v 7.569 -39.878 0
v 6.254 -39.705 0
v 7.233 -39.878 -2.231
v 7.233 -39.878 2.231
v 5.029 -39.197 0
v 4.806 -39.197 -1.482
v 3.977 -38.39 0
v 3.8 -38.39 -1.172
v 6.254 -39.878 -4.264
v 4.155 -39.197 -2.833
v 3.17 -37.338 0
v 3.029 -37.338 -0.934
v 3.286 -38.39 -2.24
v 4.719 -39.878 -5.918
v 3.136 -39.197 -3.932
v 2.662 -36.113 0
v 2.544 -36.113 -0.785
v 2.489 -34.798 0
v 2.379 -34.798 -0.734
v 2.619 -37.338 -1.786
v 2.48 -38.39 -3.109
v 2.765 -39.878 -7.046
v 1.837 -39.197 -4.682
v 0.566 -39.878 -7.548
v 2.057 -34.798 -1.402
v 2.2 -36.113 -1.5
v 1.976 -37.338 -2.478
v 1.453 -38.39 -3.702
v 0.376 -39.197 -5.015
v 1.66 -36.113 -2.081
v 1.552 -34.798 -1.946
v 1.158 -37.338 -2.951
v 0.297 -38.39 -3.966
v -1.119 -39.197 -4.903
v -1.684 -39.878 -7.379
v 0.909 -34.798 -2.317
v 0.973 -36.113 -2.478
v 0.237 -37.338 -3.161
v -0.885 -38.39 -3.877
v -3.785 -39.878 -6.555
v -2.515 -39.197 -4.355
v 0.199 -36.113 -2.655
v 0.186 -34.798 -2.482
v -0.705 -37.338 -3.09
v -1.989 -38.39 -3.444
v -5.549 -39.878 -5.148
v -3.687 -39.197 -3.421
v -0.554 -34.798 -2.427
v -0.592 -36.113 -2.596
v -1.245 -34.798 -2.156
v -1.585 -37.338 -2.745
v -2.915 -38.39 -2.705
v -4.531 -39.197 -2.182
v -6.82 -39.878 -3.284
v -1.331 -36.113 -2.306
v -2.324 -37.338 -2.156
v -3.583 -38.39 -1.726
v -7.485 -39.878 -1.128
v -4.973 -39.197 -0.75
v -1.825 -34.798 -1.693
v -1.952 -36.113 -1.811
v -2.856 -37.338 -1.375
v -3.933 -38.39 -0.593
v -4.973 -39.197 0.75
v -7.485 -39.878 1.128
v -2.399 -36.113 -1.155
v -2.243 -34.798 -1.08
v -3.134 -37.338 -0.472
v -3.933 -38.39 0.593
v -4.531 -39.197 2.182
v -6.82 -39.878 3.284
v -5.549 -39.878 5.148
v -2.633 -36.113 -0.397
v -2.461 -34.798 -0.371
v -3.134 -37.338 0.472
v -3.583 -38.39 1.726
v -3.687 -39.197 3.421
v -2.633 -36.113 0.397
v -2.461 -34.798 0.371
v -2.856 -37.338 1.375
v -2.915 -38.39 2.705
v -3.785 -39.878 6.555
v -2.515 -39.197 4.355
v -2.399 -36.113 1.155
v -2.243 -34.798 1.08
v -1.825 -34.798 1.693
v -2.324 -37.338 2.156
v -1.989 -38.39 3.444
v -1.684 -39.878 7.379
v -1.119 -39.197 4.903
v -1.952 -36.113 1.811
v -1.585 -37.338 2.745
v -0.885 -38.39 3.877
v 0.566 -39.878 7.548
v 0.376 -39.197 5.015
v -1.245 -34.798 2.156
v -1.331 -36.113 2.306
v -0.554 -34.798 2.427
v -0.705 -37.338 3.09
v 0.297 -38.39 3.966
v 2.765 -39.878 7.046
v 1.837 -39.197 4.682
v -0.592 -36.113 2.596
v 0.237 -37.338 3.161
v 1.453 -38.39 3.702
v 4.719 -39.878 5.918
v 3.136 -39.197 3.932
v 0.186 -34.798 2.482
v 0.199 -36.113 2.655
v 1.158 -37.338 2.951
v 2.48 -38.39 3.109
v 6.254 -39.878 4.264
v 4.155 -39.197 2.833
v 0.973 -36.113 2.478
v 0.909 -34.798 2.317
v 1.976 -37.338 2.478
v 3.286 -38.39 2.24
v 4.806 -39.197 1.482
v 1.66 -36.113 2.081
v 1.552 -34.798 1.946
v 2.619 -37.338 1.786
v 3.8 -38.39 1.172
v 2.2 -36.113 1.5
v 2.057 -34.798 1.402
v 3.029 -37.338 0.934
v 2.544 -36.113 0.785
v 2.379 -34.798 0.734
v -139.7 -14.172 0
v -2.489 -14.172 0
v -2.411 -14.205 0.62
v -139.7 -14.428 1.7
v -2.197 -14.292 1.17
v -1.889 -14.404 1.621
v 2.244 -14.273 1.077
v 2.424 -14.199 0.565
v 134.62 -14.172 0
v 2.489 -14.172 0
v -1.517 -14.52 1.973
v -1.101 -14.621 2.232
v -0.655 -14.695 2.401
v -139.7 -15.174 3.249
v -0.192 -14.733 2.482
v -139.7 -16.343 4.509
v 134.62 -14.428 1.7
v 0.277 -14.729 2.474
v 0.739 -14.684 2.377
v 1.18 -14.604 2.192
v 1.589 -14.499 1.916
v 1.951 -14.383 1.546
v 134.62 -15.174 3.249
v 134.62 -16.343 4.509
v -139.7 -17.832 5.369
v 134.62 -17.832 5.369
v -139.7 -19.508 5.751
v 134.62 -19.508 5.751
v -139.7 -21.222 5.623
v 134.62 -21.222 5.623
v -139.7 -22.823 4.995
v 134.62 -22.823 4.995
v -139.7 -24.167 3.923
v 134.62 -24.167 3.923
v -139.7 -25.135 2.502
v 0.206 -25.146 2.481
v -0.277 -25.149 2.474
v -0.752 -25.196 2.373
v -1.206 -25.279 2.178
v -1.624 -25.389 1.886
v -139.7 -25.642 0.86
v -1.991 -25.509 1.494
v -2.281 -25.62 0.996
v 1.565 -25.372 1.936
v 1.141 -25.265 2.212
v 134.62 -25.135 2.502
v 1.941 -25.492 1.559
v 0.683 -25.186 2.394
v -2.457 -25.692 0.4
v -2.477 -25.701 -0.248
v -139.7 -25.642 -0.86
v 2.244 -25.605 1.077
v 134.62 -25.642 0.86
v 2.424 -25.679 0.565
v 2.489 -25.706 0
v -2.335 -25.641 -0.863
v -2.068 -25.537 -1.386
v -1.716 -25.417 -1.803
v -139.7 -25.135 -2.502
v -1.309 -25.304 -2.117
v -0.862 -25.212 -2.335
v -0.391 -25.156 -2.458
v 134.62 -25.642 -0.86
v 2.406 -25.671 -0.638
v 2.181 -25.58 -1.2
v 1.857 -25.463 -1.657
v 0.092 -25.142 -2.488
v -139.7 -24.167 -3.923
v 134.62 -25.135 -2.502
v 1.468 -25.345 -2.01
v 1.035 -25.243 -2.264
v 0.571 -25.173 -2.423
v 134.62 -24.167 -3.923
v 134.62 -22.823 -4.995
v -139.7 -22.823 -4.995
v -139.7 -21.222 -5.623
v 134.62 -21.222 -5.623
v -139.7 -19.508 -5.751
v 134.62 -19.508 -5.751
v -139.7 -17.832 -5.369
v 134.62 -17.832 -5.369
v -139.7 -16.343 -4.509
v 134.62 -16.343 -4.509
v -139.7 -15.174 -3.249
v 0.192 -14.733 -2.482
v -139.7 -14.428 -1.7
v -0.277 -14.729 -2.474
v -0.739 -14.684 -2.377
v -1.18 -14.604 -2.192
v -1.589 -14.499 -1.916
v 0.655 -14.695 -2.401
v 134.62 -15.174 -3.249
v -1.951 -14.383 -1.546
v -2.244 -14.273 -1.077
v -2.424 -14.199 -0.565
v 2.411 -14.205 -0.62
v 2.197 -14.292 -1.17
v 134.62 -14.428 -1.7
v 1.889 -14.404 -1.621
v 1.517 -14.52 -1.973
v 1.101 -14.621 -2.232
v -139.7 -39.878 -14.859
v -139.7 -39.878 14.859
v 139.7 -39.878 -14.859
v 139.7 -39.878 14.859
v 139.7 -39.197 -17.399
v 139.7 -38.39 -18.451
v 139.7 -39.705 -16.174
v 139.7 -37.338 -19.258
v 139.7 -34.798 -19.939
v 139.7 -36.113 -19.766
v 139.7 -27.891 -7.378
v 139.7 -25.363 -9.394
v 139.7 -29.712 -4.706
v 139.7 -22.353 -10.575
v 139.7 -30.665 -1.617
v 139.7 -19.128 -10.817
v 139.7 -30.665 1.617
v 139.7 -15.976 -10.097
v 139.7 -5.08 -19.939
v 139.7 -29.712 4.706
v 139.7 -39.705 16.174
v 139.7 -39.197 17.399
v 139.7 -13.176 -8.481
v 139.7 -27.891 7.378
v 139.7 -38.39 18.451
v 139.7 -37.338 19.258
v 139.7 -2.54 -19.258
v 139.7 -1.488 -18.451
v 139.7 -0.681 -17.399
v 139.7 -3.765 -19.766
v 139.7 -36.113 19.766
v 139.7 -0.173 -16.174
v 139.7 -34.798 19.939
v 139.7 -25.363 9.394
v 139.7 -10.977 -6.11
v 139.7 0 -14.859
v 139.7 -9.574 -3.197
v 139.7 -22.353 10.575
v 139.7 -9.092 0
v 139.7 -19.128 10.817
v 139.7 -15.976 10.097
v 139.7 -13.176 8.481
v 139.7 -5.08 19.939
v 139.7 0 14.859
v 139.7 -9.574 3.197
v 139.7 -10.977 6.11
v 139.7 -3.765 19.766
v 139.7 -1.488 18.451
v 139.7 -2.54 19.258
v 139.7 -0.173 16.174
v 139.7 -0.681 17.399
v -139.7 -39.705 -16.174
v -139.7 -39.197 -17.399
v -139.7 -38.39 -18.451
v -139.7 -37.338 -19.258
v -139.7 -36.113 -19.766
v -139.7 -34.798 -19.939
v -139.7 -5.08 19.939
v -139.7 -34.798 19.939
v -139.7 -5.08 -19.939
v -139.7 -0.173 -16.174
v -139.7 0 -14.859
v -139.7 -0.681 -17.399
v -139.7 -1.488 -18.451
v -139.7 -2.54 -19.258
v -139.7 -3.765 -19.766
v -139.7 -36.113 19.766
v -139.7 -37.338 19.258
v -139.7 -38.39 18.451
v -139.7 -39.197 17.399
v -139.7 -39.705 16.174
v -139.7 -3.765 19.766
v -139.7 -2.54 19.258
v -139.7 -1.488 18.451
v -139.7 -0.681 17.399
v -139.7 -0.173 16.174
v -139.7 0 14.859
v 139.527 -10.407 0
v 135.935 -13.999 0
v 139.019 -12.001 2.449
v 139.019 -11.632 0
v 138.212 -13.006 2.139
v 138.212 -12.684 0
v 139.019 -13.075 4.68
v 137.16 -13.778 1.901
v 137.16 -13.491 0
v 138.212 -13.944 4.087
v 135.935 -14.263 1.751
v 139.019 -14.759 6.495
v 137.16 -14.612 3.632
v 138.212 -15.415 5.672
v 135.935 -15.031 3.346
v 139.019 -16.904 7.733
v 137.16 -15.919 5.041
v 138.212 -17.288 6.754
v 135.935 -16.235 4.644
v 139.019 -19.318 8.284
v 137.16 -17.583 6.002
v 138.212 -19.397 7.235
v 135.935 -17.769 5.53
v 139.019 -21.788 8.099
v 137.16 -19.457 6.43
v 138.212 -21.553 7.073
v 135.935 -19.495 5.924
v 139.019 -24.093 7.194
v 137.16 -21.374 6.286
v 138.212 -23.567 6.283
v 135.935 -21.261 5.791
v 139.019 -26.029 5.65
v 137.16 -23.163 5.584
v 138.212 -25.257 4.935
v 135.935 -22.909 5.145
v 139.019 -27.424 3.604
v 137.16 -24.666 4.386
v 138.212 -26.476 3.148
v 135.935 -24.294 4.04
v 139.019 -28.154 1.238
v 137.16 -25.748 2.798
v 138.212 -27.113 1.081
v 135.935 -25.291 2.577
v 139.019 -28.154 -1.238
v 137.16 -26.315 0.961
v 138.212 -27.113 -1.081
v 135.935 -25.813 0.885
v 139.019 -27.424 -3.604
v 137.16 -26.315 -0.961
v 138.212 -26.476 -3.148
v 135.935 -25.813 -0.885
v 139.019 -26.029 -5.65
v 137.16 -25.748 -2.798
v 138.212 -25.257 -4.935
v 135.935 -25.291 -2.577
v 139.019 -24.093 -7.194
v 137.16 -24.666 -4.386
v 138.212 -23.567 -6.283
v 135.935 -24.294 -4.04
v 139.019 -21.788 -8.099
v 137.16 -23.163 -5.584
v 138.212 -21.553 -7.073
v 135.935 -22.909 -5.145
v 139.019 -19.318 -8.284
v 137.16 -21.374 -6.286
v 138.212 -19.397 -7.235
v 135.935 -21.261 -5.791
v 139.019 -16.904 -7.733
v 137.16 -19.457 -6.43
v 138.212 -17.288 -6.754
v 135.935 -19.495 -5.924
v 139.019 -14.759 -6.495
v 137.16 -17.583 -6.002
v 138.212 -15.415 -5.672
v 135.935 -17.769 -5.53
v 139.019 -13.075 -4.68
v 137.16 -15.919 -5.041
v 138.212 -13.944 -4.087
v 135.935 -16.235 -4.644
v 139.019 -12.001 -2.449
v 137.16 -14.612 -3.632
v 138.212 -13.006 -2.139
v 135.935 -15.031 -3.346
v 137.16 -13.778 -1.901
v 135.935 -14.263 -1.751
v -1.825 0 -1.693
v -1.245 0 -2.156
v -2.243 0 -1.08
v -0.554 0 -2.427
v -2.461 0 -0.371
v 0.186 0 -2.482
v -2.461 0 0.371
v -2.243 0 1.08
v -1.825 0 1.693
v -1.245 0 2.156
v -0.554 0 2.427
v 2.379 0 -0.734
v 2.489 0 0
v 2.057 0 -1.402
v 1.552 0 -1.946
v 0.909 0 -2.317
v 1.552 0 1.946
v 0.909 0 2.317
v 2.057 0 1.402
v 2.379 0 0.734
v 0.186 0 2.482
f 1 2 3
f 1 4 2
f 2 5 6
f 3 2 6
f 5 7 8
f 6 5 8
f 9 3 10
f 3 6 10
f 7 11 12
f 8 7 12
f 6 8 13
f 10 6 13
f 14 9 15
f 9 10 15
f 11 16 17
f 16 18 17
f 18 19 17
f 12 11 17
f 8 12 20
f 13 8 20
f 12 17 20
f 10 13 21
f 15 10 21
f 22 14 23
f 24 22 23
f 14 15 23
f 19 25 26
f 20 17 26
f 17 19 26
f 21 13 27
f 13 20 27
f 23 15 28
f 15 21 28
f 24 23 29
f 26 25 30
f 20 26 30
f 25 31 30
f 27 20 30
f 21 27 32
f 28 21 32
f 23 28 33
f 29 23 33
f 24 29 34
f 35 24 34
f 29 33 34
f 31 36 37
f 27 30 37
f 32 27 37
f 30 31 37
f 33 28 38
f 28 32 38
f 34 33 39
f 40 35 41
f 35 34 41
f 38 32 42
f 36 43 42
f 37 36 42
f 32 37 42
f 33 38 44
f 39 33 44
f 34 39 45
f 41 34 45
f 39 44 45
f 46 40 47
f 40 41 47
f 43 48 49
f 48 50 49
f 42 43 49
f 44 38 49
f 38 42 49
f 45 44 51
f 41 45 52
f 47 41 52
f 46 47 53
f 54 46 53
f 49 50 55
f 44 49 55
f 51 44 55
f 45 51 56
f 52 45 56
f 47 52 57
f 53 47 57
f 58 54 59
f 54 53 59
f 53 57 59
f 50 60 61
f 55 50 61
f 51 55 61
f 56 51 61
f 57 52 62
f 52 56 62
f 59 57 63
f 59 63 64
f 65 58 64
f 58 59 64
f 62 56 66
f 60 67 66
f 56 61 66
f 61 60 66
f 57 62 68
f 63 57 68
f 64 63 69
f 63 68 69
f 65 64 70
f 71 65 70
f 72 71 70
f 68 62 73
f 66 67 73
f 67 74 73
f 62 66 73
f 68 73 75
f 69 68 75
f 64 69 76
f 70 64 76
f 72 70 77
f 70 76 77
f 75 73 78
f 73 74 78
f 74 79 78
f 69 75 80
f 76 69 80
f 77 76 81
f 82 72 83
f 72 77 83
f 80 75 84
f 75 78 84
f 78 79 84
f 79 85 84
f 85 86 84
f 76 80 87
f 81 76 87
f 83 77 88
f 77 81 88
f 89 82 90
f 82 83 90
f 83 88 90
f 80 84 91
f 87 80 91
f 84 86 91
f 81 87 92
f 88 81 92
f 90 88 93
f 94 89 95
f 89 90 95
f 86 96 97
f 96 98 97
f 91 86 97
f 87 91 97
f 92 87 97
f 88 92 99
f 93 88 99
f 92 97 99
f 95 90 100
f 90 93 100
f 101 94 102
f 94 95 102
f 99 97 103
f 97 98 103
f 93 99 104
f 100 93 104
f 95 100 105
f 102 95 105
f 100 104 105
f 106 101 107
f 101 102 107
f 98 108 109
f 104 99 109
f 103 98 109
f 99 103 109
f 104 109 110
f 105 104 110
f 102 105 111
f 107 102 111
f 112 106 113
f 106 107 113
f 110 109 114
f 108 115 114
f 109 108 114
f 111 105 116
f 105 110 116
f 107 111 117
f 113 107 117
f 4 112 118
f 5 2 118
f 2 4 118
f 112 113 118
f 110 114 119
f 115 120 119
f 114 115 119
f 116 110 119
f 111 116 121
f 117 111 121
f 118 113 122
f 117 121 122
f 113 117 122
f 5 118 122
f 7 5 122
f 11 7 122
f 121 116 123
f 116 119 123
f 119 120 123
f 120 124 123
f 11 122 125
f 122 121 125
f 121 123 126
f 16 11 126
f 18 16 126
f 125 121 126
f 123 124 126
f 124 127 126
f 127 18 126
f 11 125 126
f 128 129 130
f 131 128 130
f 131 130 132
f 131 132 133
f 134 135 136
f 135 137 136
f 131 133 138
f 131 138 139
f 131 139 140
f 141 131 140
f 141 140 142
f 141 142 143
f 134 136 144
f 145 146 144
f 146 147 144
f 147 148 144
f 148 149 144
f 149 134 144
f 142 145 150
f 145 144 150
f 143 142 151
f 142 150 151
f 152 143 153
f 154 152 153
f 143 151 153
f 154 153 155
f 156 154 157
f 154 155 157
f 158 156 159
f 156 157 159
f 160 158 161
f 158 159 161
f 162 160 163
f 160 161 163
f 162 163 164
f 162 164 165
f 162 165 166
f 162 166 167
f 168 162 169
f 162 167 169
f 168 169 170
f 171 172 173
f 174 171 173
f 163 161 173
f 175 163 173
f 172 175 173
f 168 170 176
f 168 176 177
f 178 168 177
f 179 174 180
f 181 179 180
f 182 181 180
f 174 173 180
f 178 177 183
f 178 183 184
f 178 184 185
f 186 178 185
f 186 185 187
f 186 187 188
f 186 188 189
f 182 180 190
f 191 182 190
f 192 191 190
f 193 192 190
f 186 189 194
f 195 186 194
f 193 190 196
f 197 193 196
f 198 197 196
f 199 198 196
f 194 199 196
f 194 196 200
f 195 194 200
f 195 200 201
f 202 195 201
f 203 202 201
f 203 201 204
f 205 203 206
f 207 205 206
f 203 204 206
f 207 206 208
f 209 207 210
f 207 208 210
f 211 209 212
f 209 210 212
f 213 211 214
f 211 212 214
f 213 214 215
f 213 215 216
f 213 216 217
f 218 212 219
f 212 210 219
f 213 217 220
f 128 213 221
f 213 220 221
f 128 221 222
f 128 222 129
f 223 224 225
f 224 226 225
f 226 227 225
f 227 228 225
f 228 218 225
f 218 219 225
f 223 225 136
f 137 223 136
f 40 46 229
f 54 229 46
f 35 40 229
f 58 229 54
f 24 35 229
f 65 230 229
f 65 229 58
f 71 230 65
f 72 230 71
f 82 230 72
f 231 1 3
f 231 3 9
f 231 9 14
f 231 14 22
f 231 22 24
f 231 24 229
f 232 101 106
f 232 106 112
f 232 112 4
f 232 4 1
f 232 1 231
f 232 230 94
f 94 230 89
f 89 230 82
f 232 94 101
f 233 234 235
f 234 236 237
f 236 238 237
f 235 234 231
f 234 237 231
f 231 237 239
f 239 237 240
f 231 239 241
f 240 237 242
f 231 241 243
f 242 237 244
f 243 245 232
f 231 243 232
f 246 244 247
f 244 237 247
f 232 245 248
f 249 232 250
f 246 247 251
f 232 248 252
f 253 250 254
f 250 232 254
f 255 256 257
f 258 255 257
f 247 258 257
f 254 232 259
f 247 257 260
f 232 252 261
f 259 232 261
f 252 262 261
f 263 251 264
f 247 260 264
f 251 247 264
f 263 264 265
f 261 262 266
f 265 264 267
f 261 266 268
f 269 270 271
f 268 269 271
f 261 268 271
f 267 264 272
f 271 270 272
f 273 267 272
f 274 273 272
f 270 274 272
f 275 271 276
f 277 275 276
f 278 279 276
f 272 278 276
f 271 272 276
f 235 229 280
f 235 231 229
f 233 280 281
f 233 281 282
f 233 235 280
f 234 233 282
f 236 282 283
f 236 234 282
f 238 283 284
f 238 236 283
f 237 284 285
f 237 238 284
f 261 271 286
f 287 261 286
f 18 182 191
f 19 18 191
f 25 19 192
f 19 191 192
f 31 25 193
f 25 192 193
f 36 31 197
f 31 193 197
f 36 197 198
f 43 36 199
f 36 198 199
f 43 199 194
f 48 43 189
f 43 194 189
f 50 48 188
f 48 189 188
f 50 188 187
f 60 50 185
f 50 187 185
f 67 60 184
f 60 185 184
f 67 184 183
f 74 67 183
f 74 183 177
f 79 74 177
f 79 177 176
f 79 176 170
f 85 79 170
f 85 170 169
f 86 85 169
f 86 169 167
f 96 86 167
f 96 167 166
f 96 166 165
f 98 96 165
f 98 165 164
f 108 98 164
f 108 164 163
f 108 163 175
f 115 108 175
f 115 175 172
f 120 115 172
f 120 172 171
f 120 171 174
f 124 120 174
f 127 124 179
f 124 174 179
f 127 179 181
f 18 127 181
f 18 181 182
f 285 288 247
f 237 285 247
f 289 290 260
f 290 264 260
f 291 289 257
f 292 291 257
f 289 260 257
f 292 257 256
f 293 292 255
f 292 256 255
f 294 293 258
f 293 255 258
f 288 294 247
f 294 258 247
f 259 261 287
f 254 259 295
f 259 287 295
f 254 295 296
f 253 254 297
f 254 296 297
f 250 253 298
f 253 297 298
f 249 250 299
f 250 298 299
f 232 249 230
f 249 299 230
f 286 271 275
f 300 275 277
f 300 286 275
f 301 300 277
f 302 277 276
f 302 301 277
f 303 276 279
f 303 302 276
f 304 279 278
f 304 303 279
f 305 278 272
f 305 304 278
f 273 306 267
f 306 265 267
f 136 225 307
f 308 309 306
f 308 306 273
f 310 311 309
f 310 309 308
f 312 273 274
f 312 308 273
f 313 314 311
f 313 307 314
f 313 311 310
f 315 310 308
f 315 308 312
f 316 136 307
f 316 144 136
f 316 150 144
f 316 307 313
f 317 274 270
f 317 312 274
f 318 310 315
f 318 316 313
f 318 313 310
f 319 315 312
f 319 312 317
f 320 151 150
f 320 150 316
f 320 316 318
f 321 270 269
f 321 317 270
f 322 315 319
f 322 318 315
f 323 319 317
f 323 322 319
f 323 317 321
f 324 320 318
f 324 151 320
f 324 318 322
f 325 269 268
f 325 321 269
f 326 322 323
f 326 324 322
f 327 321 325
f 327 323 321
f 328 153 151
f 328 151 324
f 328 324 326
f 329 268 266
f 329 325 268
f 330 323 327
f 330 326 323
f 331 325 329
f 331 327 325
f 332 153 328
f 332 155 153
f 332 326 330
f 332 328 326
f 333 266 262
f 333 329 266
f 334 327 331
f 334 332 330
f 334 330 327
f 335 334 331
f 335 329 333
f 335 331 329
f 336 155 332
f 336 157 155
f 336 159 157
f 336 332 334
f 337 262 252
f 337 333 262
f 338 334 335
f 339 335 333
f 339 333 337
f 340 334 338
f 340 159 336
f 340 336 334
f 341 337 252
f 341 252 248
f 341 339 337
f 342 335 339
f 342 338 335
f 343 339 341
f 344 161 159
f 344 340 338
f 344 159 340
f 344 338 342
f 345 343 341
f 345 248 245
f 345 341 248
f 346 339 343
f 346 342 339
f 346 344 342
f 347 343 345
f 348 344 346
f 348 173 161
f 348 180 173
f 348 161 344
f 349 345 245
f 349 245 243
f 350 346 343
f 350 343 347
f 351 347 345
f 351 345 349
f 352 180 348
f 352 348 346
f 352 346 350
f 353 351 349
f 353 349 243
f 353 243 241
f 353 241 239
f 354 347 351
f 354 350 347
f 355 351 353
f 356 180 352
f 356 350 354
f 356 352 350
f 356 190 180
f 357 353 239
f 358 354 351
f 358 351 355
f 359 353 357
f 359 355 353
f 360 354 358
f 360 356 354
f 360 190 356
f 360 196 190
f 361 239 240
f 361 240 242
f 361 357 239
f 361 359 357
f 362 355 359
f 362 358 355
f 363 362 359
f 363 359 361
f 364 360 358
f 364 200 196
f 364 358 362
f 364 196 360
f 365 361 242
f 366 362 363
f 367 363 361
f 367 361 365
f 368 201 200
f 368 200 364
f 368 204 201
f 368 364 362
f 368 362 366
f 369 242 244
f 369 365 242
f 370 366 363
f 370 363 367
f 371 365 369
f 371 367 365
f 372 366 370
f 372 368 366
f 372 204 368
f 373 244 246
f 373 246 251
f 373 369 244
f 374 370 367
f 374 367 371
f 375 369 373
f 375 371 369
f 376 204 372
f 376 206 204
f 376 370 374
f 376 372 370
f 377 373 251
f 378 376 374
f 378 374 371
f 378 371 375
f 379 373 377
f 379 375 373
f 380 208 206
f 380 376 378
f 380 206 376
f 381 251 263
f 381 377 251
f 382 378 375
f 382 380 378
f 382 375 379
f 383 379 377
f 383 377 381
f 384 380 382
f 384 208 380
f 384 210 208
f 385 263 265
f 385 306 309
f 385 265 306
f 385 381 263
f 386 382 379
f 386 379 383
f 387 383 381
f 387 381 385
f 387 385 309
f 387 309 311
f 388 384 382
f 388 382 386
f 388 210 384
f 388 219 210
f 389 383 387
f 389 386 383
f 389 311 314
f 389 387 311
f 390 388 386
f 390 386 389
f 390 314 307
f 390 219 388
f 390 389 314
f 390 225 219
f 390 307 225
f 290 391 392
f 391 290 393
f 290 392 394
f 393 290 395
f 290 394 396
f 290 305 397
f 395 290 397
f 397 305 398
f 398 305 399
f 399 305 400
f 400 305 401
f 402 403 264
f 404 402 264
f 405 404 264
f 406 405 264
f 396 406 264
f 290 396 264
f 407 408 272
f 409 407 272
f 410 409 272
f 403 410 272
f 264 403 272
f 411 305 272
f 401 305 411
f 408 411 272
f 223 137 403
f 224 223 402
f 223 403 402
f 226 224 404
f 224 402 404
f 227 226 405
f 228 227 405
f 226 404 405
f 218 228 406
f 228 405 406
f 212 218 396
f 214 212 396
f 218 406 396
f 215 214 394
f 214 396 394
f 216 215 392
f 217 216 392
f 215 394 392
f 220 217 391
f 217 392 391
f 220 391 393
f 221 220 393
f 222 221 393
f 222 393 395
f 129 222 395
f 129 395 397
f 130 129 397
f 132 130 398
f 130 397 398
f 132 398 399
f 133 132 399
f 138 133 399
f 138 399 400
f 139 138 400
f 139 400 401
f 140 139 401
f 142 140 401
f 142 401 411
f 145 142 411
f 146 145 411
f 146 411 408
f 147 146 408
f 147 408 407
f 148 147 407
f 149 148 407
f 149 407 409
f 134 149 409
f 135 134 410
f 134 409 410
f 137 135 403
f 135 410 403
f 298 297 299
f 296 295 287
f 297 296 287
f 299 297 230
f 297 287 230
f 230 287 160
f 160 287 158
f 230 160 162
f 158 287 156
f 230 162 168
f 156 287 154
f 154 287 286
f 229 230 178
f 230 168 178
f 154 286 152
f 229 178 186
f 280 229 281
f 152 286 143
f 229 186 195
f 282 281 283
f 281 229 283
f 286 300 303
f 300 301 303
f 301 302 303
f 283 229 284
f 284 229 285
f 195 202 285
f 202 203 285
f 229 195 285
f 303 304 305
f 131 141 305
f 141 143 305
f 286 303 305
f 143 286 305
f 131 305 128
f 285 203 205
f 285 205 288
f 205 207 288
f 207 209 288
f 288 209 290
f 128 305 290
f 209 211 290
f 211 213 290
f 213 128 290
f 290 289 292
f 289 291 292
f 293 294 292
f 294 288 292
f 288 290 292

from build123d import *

# Parameters (mm, degrees)
F1_DEPTH = 39.878
F2_R     = 5.767295
F3_DEPTH = 279.401
F4_R     = 5.08


with BuildPart() as f1:
    # F0 (on Front) → F1 (new body)
    with BuildSketch(Plane.XZ):
        with BuildLine():
            Line((139.7, 0), (139.7, 19.939))
            Line((139.7, 19.939), (-139.7, 19.939))
            Line((-139.7, 19.939), (-139.7, 0))
            Line((-139.7, 0), (-2.4892, 0))
            ThreePointArc((-2.4892, 0), (0, 2.4892), (2.4892, 0))
            Line((2.4892, 0), (139.7, 0))
        make_face()
        with BuildLine():
            Line((139.7, -19.939), (139.7, 0))
            Line((139.7, 0), (2.4892, 0))
            ThreePointArc((2.4892, 0), (0, -2.4892), (-2.4892, 0))
            Line((-2.4892, 0), (-139.7, 0))
            Line((-139.7, 0), (-139.7, -19.939))
            Line((-139.7, -19.939), (139.7, -19.939))
        make_face()
    extrude(amount=F1_DEPTH)

    # F2 (on face) → F3 (cut, through all)
    with BuildSketch(Plane.YZ.offset(139.7)):
        with Locations((-19.939, 0)):
            Circle(F2_R)
    extrude(amount=-F3_DEPTH, mode=Mode.SUBTRACT)

    # F4
    f4_edges = [f1.edges().sort_by_distance(p)[0] for p in [
        (139.7, -25.706295, 0),
        (-2.4892, -39.878, 0),
        (0, -39.878, 19.939),
        (0, 0, 19.939),
        (0, 0, -19.939),
        (0, -39.878, -19.939),
    ]]
    fillet(f4_edges, radius=F4_R)


solid = f1.part
